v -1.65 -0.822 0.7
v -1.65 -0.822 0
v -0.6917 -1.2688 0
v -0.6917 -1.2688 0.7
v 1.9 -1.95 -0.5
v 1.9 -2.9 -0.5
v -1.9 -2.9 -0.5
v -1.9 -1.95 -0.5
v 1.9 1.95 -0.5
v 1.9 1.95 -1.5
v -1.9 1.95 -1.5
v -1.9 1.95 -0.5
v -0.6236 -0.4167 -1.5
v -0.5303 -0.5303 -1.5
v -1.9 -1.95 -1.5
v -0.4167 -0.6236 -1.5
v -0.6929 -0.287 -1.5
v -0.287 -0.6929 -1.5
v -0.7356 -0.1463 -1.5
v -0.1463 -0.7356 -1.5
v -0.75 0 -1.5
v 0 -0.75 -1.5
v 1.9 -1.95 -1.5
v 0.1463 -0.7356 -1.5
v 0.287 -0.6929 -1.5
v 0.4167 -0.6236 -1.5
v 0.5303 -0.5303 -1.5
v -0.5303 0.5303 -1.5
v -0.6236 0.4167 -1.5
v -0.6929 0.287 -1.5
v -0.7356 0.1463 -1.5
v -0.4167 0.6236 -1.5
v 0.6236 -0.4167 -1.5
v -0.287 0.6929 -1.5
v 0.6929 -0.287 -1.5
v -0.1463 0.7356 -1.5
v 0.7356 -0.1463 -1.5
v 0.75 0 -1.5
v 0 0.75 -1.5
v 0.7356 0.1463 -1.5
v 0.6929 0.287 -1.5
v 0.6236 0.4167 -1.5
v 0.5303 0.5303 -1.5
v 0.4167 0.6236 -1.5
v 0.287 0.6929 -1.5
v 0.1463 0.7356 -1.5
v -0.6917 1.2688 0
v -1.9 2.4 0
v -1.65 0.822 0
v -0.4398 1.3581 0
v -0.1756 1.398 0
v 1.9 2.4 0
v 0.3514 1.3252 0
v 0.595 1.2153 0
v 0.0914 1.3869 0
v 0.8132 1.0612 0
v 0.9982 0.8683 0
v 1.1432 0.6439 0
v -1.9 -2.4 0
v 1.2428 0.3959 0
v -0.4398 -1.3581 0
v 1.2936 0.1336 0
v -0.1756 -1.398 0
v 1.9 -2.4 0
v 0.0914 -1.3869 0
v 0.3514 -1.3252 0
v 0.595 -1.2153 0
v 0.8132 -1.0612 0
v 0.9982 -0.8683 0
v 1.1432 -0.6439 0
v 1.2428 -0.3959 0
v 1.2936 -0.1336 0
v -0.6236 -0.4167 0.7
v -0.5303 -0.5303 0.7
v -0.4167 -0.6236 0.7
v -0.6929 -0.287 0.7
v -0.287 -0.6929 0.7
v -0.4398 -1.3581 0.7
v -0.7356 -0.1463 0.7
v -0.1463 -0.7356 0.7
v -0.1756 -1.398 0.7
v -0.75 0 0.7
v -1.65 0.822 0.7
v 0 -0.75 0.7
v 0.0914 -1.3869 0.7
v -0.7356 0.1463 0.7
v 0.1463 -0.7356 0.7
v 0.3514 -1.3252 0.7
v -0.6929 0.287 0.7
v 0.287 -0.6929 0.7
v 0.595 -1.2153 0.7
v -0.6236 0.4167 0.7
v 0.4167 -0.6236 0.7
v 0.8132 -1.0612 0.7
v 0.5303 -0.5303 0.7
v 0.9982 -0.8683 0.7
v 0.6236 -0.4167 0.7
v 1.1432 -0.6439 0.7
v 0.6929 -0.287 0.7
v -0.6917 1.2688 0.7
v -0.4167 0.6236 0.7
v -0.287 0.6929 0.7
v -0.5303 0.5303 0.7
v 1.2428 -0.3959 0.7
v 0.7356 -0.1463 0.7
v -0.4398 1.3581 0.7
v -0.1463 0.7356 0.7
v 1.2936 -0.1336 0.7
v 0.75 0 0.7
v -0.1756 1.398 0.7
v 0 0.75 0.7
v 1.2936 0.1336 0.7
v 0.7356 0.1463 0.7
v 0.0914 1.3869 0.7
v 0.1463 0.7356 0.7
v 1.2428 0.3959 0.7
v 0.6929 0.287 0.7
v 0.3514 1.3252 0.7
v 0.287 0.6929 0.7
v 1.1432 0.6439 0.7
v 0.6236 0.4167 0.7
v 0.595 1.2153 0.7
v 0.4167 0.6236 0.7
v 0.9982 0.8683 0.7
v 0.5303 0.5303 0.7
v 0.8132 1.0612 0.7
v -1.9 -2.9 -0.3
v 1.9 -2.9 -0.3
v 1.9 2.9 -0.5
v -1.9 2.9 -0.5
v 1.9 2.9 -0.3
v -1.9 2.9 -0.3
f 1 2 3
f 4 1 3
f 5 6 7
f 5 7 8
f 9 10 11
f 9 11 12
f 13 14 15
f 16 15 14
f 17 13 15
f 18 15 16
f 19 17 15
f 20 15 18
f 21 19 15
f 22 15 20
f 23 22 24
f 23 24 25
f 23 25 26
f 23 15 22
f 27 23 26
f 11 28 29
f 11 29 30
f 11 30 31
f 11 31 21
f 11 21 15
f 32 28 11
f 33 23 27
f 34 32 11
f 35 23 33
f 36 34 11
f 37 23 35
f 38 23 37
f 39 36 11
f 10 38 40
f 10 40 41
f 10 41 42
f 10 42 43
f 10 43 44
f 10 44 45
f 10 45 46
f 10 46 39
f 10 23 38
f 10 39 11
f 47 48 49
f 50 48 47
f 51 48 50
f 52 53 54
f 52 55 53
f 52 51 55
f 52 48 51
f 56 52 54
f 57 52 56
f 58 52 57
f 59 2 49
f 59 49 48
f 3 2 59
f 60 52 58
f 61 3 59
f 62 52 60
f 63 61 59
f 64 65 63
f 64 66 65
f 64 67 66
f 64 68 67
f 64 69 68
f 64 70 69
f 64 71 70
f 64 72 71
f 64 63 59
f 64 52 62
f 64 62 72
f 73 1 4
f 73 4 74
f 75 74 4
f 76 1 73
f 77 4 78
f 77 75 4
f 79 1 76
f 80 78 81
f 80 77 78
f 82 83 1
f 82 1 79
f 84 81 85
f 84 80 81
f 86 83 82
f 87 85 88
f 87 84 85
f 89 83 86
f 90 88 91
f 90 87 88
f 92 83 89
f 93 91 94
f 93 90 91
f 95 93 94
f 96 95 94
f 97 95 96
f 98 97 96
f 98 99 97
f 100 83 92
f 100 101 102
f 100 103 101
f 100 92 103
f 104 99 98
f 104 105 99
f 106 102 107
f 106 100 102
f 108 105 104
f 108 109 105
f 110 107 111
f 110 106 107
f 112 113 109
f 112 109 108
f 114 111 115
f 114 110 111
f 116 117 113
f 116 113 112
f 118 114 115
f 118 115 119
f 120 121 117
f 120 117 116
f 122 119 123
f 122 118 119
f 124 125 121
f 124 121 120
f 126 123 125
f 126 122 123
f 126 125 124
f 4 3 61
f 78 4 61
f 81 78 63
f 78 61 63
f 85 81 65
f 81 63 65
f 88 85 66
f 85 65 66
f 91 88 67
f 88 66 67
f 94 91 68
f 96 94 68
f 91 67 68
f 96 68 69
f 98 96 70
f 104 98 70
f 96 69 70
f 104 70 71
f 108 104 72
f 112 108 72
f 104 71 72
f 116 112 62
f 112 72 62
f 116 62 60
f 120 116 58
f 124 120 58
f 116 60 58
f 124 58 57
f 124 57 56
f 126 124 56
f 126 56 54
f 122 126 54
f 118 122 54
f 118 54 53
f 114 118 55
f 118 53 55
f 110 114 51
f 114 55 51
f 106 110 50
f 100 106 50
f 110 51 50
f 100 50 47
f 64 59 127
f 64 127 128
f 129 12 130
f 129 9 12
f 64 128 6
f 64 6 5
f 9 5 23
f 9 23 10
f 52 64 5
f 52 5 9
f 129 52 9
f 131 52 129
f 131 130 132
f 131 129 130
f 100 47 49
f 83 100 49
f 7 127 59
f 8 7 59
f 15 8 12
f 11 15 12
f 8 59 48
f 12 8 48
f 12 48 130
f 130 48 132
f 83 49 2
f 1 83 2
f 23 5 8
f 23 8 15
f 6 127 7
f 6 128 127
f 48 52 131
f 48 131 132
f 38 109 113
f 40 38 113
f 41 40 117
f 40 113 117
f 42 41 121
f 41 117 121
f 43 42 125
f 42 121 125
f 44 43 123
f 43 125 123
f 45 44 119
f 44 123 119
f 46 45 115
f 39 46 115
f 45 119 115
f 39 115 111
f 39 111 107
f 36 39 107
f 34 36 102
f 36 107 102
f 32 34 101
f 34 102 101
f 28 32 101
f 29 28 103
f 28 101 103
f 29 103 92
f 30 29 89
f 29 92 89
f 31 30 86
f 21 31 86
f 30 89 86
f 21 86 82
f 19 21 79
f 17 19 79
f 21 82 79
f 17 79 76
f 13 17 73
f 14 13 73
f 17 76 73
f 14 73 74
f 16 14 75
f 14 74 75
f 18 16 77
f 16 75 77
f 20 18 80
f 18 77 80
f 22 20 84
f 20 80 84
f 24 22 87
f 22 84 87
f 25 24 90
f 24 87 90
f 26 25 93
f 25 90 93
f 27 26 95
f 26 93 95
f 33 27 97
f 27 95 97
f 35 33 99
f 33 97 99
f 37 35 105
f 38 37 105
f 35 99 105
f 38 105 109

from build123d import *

# Parameters (mm, degrees)
F1_DEPTH = 1.9
F2_SIZE2 = 0.5
F2_SIZE  = 0.3
F3_SIZE2 = 0.5
F3_SIZE  = 0.3
F5_DEPTH = 0.7
F6_R     = 0.75
F7_DEPTH = 2.2


with BuildPart() as f1:
    # F0 (on Right) → F1 (new body, symmetric)
    with BuildSketch(Plane.YZ):
        Polygon((2.9, 0), (-2.9, 0), (-2.9, -0.5), (-1.95, -0.5), (-1.95, -1.5), (1.95, -1.5), (1.95, -0.5), (2.9, -0.5), align=None)
    extrude(amount=F1_DEPTH, both=True)

    # F2
    f2_edges = [f1.edges().sort_by_distance(p)[0] for p in [
        (0, 2.9, 0),
    ]]
    f2_side = f1.faces().sort_by_distance((0, 2.9, -0.25))[0]
    chamfer(f2_edges, length=F2_SIZE, length2=F2_SIZE2, reference=f2_side)

    # F3
    f3_edges = [f1.edges().sort_by_distance(p)[0] for p in [
        (0, -2.9, 0),
    ]]
    f3_side = f1.faces().sort_by_distance((0, -2.9, -0.25))[0]
    chamfer(f3_edges, length=F3_SIZE, length2=F3_SIZE2, reference=f3_side)

    # F4 (on face) → F5 (join)
    with BuildSketch(Plane.XY):
        with BuildLine():
            Line((-1.65, -0.8219522164), (-0.6916655664, -1.2688309019))
            ThreePointArc((-0.6916655664, -1.2688309019), (1.3, 0), (-0.6916655664, 1.2688309019))
            Line((-0.6916655664, 1.2688309019), (-1.65, 0.8219522164))
            Line((-1.65, 0.8219522164), (-1.65, -0.8219522164))
        make_face()
    extrude(amount=F5_DEPTH)

    # F6 (on face) → F7 (cut, through all)
    with BuildSketch(Plane.XY.offset(0.7)):
        Circle(F6_R)
    extrude(amount=-F7_DEPTH, mode=Mode.SUBTRACT)


solid = f1.part
